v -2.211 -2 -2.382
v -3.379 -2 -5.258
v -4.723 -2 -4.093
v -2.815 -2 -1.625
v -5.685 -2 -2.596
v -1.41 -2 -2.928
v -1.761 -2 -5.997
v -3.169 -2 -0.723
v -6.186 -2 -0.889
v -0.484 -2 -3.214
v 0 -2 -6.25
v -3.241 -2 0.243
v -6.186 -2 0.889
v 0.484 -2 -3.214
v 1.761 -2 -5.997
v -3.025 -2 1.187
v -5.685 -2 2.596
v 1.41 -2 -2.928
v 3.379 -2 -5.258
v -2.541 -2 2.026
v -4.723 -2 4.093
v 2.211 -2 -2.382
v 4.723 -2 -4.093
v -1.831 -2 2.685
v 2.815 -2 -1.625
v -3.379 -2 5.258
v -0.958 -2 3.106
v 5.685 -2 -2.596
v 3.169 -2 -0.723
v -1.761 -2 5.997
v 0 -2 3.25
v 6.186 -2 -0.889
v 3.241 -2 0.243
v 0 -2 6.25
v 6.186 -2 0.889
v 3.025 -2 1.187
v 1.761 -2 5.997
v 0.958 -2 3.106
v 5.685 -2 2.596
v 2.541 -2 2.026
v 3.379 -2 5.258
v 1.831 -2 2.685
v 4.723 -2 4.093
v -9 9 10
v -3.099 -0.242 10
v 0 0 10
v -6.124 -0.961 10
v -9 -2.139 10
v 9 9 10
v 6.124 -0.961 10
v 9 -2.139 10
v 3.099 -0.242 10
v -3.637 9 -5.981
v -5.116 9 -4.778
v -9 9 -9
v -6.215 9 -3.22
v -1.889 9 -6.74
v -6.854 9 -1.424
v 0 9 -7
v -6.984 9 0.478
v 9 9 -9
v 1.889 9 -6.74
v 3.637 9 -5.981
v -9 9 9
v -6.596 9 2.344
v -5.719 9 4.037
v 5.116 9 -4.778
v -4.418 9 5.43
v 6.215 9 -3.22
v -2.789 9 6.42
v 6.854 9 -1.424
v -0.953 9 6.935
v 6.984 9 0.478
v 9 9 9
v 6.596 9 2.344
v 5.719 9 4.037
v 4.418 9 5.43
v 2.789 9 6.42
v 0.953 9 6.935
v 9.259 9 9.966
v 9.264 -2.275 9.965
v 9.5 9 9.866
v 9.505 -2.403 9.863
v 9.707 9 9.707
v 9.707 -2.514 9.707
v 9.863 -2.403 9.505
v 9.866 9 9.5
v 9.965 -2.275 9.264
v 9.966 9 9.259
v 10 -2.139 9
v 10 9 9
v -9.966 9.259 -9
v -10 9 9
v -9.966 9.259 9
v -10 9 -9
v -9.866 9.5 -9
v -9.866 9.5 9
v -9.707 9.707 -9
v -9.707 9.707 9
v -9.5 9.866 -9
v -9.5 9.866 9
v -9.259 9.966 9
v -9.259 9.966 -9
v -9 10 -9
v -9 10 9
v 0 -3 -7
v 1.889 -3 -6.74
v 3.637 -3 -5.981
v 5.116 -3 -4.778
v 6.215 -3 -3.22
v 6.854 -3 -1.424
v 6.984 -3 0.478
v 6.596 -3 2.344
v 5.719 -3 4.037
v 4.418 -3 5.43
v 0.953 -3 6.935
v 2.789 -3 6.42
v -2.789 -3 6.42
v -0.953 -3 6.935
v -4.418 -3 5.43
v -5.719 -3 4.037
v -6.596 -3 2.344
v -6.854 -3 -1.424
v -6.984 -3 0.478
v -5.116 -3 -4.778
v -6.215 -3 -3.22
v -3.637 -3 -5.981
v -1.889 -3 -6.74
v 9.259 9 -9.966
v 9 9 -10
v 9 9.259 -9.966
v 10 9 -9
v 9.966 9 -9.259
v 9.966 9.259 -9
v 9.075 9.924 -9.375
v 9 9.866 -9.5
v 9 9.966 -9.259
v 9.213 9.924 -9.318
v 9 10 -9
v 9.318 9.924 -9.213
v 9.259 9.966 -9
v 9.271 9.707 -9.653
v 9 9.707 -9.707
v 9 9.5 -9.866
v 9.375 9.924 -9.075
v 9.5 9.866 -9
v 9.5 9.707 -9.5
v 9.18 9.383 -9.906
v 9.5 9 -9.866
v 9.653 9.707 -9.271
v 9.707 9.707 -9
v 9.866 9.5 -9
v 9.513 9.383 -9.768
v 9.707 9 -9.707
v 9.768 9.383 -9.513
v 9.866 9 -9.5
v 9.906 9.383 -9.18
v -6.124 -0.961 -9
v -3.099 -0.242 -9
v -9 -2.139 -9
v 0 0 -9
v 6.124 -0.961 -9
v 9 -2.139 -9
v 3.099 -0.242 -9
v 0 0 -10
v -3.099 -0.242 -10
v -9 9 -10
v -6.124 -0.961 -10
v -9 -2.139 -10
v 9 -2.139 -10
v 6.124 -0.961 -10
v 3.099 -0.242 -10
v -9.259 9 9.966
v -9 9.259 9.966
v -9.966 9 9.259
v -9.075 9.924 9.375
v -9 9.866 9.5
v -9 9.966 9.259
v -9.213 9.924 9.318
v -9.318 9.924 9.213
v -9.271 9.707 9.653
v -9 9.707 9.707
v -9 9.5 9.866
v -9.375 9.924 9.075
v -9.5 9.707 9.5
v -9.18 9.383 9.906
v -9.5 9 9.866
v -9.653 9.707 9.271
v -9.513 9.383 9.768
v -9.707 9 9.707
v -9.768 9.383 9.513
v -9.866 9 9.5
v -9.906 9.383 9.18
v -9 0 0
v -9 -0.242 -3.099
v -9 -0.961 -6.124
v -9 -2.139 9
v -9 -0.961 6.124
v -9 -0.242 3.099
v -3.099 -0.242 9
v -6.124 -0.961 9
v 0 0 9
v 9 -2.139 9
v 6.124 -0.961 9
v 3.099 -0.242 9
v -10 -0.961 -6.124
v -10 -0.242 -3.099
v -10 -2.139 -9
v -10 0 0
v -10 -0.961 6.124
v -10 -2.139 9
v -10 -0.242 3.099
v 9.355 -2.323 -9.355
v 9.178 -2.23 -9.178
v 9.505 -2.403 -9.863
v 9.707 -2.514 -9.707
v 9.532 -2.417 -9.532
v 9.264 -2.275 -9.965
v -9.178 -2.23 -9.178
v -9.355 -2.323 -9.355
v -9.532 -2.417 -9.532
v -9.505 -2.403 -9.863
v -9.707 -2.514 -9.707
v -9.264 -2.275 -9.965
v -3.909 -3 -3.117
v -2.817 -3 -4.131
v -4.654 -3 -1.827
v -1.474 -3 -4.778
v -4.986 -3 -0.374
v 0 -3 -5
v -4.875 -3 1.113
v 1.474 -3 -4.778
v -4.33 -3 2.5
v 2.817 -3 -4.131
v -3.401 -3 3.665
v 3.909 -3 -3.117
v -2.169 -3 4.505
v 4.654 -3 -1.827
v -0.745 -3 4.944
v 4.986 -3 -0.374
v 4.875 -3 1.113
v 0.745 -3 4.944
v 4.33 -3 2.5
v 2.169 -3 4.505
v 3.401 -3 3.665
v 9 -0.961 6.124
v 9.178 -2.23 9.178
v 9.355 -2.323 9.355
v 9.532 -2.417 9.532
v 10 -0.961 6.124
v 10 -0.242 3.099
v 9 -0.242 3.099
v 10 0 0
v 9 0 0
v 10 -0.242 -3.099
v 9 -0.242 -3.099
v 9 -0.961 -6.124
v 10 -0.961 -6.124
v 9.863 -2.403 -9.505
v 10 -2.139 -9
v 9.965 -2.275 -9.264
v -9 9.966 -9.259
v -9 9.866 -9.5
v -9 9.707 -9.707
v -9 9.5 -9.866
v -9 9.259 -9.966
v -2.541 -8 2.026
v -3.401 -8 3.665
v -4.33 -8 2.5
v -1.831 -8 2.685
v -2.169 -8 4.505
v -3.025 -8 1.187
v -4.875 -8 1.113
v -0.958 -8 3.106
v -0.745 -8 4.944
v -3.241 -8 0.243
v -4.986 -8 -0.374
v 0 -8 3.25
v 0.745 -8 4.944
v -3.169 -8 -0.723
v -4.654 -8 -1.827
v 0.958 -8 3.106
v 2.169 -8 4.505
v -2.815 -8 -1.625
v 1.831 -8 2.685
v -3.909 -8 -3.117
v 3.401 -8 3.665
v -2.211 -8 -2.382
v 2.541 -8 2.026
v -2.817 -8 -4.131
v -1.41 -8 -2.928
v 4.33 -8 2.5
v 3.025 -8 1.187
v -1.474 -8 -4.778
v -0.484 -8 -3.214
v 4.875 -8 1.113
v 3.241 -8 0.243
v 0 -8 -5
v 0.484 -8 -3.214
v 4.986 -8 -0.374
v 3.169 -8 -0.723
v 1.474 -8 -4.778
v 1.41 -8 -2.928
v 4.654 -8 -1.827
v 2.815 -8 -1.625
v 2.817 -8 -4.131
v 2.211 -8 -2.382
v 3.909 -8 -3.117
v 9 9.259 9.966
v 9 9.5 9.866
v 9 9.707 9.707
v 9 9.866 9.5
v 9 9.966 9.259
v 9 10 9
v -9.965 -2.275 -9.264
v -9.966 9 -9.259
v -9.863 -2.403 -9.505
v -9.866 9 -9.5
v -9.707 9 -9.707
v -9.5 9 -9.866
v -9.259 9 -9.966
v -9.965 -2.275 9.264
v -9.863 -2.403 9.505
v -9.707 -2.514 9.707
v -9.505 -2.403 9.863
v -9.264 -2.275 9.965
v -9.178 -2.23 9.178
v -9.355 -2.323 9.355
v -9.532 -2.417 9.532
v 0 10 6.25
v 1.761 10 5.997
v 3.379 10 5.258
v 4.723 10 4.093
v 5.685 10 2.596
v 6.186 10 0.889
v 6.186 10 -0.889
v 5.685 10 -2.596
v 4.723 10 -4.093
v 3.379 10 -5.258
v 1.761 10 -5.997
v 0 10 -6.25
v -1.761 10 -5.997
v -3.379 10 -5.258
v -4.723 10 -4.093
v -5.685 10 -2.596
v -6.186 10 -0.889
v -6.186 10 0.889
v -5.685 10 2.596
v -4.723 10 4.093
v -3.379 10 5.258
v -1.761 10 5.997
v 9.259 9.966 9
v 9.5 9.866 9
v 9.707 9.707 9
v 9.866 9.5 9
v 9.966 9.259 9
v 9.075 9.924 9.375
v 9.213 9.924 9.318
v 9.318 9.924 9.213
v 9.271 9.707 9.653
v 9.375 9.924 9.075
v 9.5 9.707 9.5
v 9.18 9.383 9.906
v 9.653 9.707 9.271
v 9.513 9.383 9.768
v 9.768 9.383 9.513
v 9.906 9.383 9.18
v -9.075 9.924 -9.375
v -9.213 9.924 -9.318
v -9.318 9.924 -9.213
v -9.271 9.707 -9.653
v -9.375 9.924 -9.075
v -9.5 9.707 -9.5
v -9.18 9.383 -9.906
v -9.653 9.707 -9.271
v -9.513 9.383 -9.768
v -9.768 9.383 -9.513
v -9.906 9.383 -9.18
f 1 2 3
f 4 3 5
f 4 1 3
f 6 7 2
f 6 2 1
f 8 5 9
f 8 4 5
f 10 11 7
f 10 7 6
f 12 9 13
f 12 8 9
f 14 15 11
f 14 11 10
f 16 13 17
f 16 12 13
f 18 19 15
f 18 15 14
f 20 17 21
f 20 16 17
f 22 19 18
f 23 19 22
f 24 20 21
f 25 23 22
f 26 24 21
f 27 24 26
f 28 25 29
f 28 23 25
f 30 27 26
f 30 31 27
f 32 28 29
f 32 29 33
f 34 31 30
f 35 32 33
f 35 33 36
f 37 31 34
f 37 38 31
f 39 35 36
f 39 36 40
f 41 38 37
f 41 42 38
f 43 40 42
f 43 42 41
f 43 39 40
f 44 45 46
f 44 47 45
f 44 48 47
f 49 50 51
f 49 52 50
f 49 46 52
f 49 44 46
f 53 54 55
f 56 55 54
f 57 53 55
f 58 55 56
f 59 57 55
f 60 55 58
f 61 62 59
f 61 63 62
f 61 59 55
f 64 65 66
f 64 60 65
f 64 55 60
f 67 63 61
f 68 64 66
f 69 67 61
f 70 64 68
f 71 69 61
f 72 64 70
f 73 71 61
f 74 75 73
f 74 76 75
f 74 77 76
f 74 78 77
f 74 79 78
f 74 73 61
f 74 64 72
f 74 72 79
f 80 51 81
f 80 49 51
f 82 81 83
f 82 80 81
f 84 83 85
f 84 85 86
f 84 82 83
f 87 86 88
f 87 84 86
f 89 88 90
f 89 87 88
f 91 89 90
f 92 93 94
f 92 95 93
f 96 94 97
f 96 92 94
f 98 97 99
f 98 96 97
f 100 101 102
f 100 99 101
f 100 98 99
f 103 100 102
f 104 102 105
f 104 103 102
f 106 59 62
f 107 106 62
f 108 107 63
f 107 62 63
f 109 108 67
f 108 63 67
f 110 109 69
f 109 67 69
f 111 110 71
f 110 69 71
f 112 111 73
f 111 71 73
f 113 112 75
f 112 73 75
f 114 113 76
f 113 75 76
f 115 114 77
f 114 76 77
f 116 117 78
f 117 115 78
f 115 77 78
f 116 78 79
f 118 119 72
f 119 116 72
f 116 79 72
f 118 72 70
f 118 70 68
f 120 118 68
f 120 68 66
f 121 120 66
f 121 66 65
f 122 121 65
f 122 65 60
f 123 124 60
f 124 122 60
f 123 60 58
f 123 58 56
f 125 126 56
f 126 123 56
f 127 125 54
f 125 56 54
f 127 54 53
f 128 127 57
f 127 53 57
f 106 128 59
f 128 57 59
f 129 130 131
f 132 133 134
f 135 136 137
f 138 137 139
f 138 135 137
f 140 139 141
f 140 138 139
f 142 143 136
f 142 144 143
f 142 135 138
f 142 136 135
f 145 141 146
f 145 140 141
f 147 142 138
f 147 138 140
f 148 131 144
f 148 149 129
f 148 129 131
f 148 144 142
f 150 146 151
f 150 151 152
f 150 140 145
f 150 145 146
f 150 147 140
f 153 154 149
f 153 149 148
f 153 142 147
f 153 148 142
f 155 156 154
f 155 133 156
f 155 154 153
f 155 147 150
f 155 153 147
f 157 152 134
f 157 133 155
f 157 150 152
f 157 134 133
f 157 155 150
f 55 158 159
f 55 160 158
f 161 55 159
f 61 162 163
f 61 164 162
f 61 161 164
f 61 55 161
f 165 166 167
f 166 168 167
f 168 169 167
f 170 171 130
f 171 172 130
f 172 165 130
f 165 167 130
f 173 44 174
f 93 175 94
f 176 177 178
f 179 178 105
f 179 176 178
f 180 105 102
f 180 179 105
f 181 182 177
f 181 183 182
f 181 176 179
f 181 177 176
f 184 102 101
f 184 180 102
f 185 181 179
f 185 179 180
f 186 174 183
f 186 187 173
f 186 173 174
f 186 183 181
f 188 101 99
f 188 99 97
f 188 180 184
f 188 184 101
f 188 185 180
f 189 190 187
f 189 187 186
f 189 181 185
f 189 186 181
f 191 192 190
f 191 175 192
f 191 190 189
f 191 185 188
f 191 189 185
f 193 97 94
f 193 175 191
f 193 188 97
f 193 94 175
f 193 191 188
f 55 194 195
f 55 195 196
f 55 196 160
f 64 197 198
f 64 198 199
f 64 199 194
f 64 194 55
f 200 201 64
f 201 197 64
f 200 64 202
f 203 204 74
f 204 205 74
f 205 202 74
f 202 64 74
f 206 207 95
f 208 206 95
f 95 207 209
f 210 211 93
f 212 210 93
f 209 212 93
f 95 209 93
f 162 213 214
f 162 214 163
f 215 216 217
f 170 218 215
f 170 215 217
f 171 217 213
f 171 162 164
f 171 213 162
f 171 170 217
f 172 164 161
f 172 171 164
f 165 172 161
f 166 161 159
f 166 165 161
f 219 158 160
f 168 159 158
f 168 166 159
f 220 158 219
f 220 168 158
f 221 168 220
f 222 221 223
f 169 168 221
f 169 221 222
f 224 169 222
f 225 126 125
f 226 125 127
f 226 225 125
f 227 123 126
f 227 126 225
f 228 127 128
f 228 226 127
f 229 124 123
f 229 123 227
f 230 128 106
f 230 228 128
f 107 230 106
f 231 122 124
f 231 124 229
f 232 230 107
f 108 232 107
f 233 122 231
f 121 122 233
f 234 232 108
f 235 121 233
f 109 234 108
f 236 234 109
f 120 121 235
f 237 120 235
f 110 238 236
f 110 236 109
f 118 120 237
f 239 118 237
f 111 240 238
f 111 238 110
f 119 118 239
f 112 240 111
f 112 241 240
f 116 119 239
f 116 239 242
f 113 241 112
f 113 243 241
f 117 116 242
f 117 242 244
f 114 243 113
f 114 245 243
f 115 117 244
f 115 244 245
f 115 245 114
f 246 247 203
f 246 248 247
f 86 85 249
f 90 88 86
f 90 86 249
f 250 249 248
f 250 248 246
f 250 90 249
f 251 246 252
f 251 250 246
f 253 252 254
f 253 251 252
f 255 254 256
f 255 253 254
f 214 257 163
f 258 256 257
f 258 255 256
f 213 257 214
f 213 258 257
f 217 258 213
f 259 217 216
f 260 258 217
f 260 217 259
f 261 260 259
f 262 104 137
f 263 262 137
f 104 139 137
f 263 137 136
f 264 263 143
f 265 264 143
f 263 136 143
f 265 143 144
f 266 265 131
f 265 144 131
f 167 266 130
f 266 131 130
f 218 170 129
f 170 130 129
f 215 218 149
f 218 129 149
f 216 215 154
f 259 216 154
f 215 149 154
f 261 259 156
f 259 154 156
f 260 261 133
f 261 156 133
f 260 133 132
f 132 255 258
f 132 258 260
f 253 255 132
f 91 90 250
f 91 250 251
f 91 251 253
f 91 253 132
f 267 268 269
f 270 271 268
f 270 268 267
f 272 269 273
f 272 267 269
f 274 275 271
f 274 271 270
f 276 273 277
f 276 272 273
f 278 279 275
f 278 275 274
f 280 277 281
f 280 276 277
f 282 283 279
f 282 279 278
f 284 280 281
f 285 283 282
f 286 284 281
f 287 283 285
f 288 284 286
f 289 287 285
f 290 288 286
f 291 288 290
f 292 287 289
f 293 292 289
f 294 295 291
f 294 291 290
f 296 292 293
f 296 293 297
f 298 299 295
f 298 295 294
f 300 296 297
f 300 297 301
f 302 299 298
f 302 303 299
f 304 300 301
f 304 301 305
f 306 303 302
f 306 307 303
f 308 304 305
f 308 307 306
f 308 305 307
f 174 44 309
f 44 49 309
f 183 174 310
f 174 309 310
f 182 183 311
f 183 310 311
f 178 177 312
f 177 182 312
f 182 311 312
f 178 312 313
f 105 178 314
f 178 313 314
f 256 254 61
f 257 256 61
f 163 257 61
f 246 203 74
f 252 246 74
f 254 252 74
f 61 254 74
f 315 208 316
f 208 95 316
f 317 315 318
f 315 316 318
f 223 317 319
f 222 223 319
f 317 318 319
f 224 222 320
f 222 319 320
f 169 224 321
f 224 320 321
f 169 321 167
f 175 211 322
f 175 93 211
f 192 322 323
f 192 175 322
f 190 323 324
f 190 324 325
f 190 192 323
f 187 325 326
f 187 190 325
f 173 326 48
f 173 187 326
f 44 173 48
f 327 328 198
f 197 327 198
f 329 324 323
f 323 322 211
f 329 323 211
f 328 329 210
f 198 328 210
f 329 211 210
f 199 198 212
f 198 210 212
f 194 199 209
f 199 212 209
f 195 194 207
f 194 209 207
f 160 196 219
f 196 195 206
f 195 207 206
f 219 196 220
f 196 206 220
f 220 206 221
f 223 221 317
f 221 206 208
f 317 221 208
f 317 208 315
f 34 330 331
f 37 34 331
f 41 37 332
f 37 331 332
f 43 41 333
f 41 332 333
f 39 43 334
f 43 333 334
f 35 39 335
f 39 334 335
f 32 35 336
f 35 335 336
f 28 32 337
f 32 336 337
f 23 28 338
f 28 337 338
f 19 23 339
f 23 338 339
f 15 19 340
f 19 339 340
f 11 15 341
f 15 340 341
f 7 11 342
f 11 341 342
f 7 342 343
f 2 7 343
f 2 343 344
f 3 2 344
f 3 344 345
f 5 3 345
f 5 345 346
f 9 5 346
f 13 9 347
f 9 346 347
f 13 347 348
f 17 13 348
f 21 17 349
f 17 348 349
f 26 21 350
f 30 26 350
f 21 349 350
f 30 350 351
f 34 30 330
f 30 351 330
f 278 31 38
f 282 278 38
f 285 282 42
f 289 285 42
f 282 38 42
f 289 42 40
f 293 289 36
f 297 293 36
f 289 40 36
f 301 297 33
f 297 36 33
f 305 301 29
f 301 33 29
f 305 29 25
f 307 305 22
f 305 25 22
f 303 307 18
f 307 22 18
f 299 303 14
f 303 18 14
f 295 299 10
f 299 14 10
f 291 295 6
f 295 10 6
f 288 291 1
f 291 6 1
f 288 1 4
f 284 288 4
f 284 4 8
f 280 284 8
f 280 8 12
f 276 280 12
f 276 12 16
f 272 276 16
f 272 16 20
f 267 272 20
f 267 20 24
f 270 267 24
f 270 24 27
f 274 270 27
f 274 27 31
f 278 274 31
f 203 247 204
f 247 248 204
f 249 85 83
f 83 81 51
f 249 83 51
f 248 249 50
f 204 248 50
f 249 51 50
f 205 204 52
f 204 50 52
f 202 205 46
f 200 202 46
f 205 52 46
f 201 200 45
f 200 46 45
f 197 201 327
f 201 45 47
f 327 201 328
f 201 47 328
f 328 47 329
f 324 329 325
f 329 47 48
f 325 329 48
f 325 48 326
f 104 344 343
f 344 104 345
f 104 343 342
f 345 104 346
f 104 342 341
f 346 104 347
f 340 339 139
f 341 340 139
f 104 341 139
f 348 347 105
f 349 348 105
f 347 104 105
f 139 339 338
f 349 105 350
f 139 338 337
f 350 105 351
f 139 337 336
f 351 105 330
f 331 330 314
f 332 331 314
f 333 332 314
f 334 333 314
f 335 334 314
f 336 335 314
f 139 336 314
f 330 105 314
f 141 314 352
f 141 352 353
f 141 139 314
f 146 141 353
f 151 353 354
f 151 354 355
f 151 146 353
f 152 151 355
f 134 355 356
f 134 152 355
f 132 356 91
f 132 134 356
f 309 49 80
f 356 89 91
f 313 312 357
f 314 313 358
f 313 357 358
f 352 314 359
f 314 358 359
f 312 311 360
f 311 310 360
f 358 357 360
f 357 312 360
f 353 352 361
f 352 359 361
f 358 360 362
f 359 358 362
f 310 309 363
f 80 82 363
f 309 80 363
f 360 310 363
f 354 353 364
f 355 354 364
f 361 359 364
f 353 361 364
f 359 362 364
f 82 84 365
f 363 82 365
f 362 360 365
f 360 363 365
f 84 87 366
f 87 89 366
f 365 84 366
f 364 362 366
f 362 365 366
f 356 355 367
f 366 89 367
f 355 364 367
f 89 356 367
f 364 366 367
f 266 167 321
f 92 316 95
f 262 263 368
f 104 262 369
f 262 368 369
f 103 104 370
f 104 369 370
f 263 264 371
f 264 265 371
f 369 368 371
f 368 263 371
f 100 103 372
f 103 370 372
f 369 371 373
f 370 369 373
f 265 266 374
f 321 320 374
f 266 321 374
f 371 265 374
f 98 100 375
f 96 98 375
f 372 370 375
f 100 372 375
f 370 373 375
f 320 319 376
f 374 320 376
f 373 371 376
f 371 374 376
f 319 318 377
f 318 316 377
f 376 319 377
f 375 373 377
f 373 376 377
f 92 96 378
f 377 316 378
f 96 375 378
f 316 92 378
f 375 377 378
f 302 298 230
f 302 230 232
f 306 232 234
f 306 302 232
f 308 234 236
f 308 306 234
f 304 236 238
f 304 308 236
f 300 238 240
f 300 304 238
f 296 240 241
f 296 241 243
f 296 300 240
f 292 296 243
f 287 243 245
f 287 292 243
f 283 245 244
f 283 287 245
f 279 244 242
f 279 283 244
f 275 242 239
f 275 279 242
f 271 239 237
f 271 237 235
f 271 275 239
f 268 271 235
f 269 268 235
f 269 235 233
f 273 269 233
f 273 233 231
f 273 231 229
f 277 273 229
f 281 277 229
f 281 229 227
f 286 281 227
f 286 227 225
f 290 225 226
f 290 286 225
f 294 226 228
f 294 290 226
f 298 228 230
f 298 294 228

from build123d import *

# Parameters (mm, degrees)
IZIM1_W                     = 20
IZIM1_H                     = 20
Y_KSEKLIK_EKSTR_ZYON1_DEPTH = 10
BO_ALTMA1_T                 = -1
IZIM2_R                     = 7
Y_KSEKLIK_EKSTR_ZYON2_DEPTH = 17
IZIM3_R                     = 20
KES_EKSTR_ZYON2_DEPTH       = 1
IZIM4_R                     = 20
KES_EKSTR_ZYON3_DEPTH       = 1
IZIM5_R                     = 6.25
KES_EKSTR_ZYON4_DEPTH       = 12
IZIM6_R                     = 3.25
KES_EKSTR_ZYON5_DEPTH       = 10
IZIM7_R                     = 8
IZIM7_R_2                   = 5
KES_EKSTR_ZYON6_DEPTH       = 5
RADYUS2_R                   = 1


with BuildPart() as part:
    # Çizim1 → Yükseklik-Ekstrüzyon1 (new, symmetric)
    with BuildSketch(Plane.XY):
        Rectangle(IZIM1_W, IZIM1_H)
    extrude(amount=Y_KSEKLIK_EKSTR_ZYON1_DEPTH, both=True)

    # İç Boşaltma1
    bo_altma1_openings = [part.faces().sort_by_distance(p)[0] for p in [
        (0, -10, 0),
    ]]
    offset(amount=BO_ALTMA1_T, openings=bo_altma1_openings, kind=Kind.INTERSECTION)

    # Çizim2 → Yükseklik-Ekstrüzyon2 (add)
    with BuildSketch(Plane.XZ.offset(-9)):
        with Locations(Location((0, 0, 0), (0, 0, 270))):
            Circle(IZIM2_R)
    extrude(amount=Y_KSEKLIK_EKSTR_ZYON2_DEPTH)

    # Çizim3 → Kes-Ekstrüzyon2 (cut)
    with BuildSketch(Plane.ZY.offset(10)):
        with Locations((0, -20)):
            Circle(IZIM3_R)
    kes_ekstr_zyon2 = extrude(amount=-KES_EKSTR_ZYON2_DEPTH, mode=Mode.SUBTRACT)

    # Aynalama1: Kes-Ekstrüzyon2 across plane
    add(kes_ekstr_zyon2.mirror(Plane(origin=(0, 0, 0), x_dir=(0, 0, 1), z_dir=(1, 0, 0))), mode=Mode.SUBTRACT)

    # Çizim4 → Kes-Ekstrüzyon3 (cut)
    with BuildSketch(Plane.XY.offset(10)):
        with Locations((0, -20)):
            Circle(IZIM4_R)
    kes_ekstr_zyon3 = extrude(amount=-KES_EKSTR_ZYON3_DEPTH, mode=Mode.SUBTRACT)

    # Aynalama2: Kes-Ekstrüzyon3 across plane
    add(kes_ekstr_zyon3.mirror(Plane.XY), mode=Mode.SUBTRACT)

    # Çizim5 → Kes-Ekstrüzyon4 (cut)
    with BuildSketch(Plane(origin=(0, 10, 0), x_dir=(1, 0, 0), z_dir=(0, 1, 0))):
        with Locations(Location((0, 0, 0), (0, 0, 270))):
            Circle(IZIM5_R)
    extrude(amount=-KES_EKSTR_ZYON4_DEPTH, mode=Mode.SUBTRACT)

    # Çizim6 → Kes-Ekstrüzyon5 (cut)
    with BuildSketch(Plane(origin=(0, -2, 0), x_dir=(1, 0, 0), z_dir=(0, 1, 0))):
        with Locations(Location((0, 0, 0), (0, 0, 270))):
            Circle(IZIM6_R)
    extrude(amount=-KES_EKSTR_ZYON5_DEPTH, mode=Mode.SUBTRACT)

    # Çizim7 → Kes-Ekstrüzyon6 (cut)
    with BuildSketch(Plane.XZ.offset(8)):
        Circle(IZIM7_R)
        with Locations(Location((0, 0, 0), (0, 0, 270))):
            Circle(IZIM7_R_2, mode=Mode.SUBTRACT)
    extrude(amount=-KES_EKSTR_ZYON6_DEPTH, mode=Mode.SUBTRACT)

    # Radyus2
    radyus2_edges = [part.edges().sort_by_distance(p)[0] for p in [
        (-10, 3.660254038, 10),
        (10, 3.660254038, -10),
        (10, 3.660254038, 10),
        (-10, 3.660254038, -10),
        (0, 10, -10),
        (0, 10, 10),
        (-10, 10, 0),
        (10, 10, 0),
    ]]
    fillet(radyus2_edges, radius=RADYUS2_R)


solid = part.part
